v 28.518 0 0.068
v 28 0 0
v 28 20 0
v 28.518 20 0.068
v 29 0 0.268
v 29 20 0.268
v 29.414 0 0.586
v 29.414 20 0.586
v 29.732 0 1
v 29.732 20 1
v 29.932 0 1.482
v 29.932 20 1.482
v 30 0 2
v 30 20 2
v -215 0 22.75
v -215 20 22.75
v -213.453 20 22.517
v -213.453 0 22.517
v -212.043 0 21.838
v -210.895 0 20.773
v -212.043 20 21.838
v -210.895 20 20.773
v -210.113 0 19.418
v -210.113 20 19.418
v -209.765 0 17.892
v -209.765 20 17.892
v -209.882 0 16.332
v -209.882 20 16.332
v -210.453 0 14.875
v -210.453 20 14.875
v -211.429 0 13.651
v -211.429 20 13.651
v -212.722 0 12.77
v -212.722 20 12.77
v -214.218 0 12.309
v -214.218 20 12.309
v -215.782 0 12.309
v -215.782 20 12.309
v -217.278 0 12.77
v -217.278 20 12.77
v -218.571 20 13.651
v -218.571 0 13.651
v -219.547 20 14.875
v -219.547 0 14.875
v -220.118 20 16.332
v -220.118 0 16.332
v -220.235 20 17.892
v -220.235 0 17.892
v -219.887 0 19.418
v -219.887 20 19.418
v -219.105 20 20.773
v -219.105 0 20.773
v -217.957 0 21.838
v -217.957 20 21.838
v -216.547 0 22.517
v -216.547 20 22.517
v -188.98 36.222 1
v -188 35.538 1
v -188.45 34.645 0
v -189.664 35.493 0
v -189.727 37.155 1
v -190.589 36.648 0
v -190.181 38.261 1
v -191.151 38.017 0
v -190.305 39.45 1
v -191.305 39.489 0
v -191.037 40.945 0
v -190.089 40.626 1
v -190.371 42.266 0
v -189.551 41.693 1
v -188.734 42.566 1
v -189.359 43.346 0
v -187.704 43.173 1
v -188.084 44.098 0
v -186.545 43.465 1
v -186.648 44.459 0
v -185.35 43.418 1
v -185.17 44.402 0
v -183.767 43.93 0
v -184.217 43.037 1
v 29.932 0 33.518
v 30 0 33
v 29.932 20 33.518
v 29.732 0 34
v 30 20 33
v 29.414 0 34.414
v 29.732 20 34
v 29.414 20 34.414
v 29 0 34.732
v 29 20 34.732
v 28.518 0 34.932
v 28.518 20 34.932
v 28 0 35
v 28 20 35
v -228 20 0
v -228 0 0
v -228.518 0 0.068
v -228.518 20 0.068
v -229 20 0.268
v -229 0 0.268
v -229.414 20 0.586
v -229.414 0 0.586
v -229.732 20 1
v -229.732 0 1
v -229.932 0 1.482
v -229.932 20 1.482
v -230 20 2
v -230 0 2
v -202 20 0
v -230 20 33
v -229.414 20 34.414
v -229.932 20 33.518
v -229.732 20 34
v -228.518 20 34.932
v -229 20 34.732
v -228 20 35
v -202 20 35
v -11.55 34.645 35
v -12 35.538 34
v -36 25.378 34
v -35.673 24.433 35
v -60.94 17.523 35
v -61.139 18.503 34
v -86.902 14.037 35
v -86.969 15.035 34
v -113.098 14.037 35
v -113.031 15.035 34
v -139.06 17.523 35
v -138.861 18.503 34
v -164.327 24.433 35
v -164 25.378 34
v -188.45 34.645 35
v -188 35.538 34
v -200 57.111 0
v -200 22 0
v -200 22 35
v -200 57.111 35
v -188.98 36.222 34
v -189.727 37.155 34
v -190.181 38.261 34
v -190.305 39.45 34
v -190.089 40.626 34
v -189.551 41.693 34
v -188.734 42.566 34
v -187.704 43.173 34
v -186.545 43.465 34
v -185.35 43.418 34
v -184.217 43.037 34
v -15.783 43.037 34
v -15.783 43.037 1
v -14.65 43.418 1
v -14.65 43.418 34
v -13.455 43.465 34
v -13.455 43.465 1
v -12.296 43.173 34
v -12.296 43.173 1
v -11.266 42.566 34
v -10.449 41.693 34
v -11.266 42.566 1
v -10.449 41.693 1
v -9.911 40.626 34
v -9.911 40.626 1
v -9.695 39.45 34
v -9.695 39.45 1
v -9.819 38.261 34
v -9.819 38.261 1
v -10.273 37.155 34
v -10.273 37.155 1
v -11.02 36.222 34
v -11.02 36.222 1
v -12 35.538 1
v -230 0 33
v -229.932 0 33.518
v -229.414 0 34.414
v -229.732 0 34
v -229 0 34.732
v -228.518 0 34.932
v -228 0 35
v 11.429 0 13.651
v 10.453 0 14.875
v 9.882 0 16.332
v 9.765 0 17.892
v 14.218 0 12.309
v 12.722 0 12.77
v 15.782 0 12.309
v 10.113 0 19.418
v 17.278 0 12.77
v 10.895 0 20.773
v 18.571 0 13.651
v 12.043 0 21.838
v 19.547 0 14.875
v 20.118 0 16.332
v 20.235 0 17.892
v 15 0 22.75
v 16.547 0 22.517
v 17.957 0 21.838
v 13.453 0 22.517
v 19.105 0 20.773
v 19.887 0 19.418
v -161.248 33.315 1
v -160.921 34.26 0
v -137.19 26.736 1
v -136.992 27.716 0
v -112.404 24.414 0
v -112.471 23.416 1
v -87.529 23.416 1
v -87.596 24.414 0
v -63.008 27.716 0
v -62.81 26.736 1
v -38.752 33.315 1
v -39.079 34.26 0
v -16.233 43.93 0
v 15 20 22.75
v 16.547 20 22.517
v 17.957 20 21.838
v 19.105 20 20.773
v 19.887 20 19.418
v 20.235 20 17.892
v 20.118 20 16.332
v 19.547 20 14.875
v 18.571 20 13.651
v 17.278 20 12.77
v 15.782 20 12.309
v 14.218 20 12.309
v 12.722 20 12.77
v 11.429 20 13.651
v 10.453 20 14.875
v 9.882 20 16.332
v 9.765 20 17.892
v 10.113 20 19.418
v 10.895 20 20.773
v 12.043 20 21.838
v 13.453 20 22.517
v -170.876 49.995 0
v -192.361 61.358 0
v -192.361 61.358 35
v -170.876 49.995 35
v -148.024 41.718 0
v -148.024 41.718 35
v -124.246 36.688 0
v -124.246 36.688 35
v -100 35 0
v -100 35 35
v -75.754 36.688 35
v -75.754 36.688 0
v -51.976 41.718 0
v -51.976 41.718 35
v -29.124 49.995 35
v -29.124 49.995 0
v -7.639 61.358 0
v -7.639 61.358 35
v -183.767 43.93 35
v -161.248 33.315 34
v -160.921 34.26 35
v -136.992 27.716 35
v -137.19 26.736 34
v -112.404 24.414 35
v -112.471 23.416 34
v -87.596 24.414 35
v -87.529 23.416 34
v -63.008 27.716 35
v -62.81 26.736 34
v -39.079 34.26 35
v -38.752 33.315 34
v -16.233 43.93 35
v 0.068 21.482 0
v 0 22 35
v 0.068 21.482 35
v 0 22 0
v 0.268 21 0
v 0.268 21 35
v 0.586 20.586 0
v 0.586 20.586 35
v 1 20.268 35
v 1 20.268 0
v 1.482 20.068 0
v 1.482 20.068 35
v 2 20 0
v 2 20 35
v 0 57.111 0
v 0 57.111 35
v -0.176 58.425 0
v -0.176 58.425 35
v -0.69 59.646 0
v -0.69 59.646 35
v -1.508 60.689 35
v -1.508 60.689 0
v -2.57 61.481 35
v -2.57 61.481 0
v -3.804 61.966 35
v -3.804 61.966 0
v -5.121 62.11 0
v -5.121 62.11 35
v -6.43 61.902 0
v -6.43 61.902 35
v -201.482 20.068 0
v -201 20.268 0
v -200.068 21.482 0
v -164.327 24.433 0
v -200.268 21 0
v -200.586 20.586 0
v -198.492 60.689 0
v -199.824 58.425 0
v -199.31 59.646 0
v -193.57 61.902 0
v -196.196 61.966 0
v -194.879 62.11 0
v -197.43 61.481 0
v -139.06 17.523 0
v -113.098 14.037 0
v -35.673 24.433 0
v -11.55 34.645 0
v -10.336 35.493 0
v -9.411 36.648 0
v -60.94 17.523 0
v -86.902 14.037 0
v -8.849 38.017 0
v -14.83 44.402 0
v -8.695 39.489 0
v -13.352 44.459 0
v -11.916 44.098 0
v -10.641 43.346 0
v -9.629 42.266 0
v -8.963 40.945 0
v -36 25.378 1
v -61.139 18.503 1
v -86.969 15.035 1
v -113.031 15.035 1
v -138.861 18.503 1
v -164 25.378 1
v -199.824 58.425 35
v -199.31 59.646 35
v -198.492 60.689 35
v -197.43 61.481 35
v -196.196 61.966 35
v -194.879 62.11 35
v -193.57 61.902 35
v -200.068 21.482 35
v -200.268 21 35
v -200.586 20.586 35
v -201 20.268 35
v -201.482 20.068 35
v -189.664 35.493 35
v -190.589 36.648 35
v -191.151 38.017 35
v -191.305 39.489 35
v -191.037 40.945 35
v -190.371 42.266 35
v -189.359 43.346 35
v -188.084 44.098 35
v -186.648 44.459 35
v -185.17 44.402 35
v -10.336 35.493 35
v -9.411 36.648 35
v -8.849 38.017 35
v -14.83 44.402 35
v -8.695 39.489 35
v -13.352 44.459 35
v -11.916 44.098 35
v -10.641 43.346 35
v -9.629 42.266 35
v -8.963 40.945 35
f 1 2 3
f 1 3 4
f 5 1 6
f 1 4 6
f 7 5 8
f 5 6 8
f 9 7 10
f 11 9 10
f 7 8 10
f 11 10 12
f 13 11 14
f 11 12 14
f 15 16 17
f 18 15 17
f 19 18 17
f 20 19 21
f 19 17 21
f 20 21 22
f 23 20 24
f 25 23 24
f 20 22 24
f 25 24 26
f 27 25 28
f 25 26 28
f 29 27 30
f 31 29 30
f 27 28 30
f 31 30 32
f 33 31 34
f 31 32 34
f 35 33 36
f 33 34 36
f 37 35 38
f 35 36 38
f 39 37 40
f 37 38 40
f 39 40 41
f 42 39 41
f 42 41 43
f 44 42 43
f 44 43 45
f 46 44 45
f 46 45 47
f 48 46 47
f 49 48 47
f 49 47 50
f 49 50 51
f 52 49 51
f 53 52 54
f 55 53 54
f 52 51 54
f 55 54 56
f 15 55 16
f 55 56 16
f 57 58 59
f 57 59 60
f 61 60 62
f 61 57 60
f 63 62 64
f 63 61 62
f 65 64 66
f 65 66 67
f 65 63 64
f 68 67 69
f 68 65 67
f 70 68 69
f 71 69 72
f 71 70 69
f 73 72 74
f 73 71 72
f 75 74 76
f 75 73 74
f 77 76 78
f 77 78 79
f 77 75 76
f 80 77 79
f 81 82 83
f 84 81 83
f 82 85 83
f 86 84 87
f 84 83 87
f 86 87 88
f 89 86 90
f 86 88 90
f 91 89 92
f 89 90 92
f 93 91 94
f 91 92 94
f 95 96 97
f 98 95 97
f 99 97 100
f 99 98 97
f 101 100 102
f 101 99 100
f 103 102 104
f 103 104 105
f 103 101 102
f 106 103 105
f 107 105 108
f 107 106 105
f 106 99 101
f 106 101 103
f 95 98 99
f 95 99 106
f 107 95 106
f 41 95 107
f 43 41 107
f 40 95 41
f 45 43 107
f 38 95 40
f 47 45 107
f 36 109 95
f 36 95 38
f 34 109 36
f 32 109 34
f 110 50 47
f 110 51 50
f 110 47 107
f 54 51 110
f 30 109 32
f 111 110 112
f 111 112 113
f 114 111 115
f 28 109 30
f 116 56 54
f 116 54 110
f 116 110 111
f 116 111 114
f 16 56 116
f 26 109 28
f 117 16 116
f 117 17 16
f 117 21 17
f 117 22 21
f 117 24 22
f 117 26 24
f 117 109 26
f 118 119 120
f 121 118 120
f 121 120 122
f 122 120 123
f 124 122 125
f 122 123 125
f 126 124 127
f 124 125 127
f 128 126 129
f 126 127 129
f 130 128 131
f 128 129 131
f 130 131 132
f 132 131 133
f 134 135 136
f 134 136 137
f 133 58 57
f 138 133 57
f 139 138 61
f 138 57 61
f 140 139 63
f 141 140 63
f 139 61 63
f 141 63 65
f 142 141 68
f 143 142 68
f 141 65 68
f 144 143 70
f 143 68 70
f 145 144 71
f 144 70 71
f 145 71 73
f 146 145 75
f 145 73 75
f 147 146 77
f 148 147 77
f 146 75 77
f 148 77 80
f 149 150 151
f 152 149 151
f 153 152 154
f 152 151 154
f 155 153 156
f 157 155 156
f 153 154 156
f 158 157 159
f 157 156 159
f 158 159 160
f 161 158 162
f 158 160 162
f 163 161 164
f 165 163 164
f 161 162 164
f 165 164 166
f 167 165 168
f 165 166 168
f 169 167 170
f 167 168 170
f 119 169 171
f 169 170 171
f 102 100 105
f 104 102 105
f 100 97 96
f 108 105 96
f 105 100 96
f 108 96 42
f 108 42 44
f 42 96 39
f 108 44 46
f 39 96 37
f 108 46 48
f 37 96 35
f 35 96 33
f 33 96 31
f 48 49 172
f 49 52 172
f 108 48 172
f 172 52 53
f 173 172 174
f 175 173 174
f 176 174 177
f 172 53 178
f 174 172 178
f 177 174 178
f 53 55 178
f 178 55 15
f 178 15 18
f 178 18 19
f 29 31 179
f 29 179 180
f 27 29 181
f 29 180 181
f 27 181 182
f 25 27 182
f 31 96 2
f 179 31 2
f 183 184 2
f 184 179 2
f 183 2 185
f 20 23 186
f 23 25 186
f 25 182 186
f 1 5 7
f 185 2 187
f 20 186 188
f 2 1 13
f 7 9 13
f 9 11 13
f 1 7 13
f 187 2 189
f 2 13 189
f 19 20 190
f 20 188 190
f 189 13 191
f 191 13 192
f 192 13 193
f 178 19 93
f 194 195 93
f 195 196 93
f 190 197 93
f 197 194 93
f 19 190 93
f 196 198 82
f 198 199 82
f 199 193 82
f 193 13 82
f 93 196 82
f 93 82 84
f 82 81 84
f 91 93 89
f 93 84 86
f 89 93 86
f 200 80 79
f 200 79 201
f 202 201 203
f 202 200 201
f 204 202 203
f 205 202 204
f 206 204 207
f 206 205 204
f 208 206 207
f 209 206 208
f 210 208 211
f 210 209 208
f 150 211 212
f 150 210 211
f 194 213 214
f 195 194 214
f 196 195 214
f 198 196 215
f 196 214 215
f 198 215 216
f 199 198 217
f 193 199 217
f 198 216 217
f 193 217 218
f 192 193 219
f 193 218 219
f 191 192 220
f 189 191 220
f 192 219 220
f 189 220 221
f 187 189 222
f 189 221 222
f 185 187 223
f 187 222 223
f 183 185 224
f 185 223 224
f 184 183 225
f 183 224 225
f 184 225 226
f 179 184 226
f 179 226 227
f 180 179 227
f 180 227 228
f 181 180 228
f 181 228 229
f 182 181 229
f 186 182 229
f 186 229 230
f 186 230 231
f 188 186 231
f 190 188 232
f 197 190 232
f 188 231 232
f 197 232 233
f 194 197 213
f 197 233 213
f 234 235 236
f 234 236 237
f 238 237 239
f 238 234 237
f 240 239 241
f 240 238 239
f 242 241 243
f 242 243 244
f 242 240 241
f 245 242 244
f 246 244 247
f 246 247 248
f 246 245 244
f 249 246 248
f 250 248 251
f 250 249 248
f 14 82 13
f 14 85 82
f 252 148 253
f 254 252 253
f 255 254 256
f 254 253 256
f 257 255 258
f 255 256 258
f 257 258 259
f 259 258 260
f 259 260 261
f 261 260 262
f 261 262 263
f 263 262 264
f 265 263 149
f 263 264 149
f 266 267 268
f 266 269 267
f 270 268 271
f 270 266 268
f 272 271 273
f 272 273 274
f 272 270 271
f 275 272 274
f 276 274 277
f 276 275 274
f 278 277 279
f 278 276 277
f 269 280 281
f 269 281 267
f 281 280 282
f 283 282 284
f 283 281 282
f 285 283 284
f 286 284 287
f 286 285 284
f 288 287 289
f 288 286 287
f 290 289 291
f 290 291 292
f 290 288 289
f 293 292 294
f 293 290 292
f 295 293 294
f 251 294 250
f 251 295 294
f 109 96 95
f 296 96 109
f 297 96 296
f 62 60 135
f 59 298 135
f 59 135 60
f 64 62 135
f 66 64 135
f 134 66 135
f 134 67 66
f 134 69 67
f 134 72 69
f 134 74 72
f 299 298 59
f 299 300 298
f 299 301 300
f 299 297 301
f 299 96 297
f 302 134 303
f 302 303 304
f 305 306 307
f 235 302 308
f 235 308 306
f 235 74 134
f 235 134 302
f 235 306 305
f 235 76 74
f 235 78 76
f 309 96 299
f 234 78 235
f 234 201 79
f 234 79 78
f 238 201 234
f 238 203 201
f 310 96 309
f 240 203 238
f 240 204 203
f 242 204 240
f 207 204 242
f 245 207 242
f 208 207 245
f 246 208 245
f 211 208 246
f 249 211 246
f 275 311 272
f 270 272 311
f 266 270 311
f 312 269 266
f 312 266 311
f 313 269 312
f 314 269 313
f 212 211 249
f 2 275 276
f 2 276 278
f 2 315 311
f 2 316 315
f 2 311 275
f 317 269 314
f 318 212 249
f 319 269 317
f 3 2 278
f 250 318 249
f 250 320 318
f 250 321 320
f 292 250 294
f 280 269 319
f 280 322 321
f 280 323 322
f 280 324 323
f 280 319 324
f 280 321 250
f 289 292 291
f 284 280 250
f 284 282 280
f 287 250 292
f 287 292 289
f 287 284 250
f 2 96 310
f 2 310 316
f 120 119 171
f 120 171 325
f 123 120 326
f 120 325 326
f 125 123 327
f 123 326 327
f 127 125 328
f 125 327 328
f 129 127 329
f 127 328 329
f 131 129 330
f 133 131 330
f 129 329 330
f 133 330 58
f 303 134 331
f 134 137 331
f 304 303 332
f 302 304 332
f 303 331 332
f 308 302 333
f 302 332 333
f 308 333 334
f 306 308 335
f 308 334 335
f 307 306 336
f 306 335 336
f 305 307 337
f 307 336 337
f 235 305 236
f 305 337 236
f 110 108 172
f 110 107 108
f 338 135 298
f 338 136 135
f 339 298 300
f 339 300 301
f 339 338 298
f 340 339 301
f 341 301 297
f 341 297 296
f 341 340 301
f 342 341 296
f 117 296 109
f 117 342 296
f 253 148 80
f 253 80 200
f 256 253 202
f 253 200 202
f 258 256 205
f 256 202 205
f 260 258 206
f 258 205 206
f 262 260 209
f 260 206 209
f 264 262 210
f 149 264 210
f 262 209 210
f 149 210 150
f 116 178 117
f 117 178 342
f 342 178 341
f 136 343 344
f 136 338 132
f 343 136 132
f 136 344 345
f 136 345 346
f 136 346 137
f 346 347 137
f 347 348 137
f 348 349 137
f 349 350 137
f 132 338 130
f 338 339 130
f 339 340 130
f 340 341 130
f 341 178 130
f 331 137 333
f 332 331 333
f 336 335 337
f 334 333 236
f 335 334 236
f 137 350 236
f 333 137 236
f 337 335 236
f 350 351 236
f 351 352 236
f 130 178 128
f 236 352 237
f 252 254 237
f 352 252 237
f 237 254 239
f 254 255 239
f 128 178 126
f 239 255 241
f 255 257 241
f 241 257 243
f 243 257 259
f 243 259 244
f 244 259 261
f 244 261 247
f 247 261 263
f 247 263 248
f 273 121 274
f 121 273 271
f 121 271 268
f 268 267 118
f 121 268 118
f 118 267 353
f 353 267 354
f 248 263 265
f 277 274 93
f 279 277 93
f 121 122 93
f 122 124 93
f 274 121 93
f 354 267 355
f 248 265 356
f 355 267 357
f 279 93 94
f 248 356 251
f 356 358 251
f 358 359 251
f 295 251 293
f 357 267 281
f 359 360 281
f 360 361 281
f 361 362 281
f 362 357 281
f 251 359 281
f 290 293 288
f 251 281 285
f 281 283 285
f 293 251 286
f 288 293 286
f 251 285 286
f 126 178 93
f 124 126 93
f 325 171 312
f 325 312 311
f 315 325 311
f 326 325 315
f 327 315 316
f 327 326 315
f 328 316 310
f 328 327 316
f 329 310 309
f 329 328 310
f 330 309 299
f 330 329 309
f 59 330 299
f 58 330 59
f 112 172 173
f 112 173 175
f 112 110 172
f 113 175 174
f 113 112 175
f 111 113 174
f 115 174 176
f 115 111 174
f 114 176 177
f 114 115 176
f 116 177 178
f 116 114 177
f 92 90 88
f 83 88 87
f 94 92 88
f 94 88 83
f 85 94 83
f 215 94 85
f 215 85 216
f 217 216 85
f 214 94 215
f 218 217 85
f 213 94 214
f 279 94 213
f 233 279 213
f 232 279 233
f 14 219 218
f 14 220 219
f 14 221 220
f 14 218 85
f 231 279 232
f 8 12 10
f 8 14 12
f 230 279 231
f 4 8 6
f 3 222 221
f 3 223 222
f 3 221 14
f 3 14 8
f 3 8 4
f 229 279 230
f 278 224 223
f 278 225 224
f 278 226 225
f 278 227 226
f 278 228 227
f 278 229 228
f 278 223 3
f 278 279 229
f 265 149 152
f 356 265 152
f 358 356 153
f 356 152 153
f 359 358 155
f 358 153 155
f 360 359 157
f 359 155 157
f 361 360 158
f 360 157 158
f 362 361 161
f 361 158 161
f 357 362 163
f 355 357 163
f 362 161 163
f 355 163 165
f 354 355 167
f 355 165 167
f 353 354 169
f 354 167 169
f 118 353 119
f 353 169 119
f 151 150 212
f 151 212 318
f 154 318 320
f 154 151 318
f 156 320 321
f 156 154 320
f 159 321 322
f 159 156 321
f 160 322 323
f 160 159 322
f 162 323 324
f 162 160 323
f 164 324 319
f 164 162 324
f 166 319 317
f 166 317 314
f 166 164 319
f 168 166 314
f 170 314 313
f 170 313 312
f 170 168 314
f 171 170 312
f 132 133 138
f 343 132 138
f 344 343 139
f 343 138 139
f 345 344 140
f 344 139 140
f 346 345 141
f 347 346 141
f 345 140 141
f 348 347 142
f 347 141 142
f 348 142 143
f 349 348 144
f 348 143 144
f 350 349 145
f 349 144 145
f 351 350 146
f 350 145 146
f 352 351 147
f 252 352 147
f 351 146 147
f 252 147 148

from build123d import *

# Parameters (mm, degrees)
BOSS_EXTRUDE1_DEPTH = 35
FILLET1_R           = 5
CHAMFER1_SIZE       = 1
SKETCH2_W           = 35
SKETCH2_H           = 20
BOSS_EXTRUDE2_DEPTH = 30
FILLET2_R           = 2
SKETCH3_W           = 35
SKETCH3_H           = 20
BOSS_EXTRUDE3_DEPTH = 30
FILLET3_R           = 2
FILLET4_R           = 2
SKETCH4_R           = 5.25
CUT_EXTRUDE1_DEPTH  = 20


with BuildPart() as part:
    # Sketch1 → Boss-Extrude1 (new body)
    with BuildSketch(Plane.XY):
        with BuildLine():
            Line((0, 0), (-200, 0))
            Line((-200, 0), (-200, 66.385933837))
            ThreePointArc((-200, 66.385933837), (-100, 35), (0, 66.385933837))
            Line((0, 66.385933837), (0, 0))
        make_face()
        with BuildLine():
            ThreePointArc((-184.216990788, 43.037433948), (-100, 23), (-15.783009212, 43.037433948))
            ThreePointArc((-15.783009212, 43.037433948), (-10.141543229, 41.178977178), (-12, 35.537511195))
            ThreePointArc((-12, 35.537511195), (-100, 14.6), (-188, 35.537511195))
            ThreePointArc((-188, 35.537511195), (-189.858456771, 41.178977178), (-184.216990788, 43.037433948))
        make_face(mode=Mode.SUBTRACT)
    extrude(amount=BOSS_EXTRUDE1_DEPTH)

    # Fillet1
    fillet1_edges = [part.edges().sort_by_distance(p)[0] for p in [
        (-200, 66.385933837, 17.5),
        (0, 66.385933837, 17.5),
    ]]
    fillet(fillet1_edges, radius=FILLET1_R)

    # Chamfer1
    chamfer1_edges = [part.edges().sort_by_distance(p)[0] for p in [
        (-189.858456771, 41.178977178, 0),
        (-100, 14.6, 0),
        (-10.141543229, 41.178977178, 0),
        (-100, 23, 0),
        (-189.858456771, 41.178977178, 35),
        (-100, 14.6, 35),
        (-10.141543229, 41.178977178, 35),
        (-100, 23, 35),
    ]]
    chamfer(chamfer1_edges, length=CHAMFER1_SIZE)

    # Sketch2 → Boss-Extrude2 (add)
    with BuildSketch(Plane(origin=(0, 0, 0), x_dir=(0, 0, -1), z_dir=(1, 0, 0))):
        with Locations((-17.5, 10)):
            Rectangle(SKETCH2_W, SKETCH2_H)
    extrude(amount=BOSS_EXTRUDE2_DEPTH)

    # Fillet2
    fillet2_edges = [part.edges().sort_by_distance(p)[0] for p in [
        (0, 20, 17.5),
    ]]
    fillet(fillet2_edges, radius=FILLET2_R)

    # Sketch3 → Boss-Extrude3 (add)
    with BuildSketch(Plane.ZY.offset(200)):
        with Locations((17.5, 10)):
            Rectangle(SKETCH3_W, SKETCH3_H)
    extrude(amount=BOSS_EXTRUDE3_DEPTH)

    # Fillet3
    fillet3_edges = [part.edges().sort_by_distance(p)[0] for p in [
        (-200, 20, 17.5),
    ]]
    fillet(fillet3_edges, radius=FILLET3_R)

    # Fillet4
    fillet4_edges = [part.edges().sort_by_distance(p)[0] for p in [
        (30, 10, 35),
        (30, 10, 0),
        (-230, 10, 0),
        (-230, 10, 35),
    ]]
    fillet(fillet4_edges, radius=FILLET4_R)

    # Sketch4 → Cut-Extrude1 (cut)
    with BuildSketch(Plane(origin=(0, 20, 0), x_dir=(1, 0, 0), z_dir=(0, 1, 0))):
        with Locations(Location((-215, -17.5, 0), (0, 0, 270))):
            Circle(SKETCH4_R)
        with Locations(Location((15, -17.5, 0), (0, 0, 270))):
            Circle(SKETCH4_R)
    extrude(amount=-CUT_EXTRUDE1_DEPTH, mode=Mode.SUBTRACT)


solid = part.part
